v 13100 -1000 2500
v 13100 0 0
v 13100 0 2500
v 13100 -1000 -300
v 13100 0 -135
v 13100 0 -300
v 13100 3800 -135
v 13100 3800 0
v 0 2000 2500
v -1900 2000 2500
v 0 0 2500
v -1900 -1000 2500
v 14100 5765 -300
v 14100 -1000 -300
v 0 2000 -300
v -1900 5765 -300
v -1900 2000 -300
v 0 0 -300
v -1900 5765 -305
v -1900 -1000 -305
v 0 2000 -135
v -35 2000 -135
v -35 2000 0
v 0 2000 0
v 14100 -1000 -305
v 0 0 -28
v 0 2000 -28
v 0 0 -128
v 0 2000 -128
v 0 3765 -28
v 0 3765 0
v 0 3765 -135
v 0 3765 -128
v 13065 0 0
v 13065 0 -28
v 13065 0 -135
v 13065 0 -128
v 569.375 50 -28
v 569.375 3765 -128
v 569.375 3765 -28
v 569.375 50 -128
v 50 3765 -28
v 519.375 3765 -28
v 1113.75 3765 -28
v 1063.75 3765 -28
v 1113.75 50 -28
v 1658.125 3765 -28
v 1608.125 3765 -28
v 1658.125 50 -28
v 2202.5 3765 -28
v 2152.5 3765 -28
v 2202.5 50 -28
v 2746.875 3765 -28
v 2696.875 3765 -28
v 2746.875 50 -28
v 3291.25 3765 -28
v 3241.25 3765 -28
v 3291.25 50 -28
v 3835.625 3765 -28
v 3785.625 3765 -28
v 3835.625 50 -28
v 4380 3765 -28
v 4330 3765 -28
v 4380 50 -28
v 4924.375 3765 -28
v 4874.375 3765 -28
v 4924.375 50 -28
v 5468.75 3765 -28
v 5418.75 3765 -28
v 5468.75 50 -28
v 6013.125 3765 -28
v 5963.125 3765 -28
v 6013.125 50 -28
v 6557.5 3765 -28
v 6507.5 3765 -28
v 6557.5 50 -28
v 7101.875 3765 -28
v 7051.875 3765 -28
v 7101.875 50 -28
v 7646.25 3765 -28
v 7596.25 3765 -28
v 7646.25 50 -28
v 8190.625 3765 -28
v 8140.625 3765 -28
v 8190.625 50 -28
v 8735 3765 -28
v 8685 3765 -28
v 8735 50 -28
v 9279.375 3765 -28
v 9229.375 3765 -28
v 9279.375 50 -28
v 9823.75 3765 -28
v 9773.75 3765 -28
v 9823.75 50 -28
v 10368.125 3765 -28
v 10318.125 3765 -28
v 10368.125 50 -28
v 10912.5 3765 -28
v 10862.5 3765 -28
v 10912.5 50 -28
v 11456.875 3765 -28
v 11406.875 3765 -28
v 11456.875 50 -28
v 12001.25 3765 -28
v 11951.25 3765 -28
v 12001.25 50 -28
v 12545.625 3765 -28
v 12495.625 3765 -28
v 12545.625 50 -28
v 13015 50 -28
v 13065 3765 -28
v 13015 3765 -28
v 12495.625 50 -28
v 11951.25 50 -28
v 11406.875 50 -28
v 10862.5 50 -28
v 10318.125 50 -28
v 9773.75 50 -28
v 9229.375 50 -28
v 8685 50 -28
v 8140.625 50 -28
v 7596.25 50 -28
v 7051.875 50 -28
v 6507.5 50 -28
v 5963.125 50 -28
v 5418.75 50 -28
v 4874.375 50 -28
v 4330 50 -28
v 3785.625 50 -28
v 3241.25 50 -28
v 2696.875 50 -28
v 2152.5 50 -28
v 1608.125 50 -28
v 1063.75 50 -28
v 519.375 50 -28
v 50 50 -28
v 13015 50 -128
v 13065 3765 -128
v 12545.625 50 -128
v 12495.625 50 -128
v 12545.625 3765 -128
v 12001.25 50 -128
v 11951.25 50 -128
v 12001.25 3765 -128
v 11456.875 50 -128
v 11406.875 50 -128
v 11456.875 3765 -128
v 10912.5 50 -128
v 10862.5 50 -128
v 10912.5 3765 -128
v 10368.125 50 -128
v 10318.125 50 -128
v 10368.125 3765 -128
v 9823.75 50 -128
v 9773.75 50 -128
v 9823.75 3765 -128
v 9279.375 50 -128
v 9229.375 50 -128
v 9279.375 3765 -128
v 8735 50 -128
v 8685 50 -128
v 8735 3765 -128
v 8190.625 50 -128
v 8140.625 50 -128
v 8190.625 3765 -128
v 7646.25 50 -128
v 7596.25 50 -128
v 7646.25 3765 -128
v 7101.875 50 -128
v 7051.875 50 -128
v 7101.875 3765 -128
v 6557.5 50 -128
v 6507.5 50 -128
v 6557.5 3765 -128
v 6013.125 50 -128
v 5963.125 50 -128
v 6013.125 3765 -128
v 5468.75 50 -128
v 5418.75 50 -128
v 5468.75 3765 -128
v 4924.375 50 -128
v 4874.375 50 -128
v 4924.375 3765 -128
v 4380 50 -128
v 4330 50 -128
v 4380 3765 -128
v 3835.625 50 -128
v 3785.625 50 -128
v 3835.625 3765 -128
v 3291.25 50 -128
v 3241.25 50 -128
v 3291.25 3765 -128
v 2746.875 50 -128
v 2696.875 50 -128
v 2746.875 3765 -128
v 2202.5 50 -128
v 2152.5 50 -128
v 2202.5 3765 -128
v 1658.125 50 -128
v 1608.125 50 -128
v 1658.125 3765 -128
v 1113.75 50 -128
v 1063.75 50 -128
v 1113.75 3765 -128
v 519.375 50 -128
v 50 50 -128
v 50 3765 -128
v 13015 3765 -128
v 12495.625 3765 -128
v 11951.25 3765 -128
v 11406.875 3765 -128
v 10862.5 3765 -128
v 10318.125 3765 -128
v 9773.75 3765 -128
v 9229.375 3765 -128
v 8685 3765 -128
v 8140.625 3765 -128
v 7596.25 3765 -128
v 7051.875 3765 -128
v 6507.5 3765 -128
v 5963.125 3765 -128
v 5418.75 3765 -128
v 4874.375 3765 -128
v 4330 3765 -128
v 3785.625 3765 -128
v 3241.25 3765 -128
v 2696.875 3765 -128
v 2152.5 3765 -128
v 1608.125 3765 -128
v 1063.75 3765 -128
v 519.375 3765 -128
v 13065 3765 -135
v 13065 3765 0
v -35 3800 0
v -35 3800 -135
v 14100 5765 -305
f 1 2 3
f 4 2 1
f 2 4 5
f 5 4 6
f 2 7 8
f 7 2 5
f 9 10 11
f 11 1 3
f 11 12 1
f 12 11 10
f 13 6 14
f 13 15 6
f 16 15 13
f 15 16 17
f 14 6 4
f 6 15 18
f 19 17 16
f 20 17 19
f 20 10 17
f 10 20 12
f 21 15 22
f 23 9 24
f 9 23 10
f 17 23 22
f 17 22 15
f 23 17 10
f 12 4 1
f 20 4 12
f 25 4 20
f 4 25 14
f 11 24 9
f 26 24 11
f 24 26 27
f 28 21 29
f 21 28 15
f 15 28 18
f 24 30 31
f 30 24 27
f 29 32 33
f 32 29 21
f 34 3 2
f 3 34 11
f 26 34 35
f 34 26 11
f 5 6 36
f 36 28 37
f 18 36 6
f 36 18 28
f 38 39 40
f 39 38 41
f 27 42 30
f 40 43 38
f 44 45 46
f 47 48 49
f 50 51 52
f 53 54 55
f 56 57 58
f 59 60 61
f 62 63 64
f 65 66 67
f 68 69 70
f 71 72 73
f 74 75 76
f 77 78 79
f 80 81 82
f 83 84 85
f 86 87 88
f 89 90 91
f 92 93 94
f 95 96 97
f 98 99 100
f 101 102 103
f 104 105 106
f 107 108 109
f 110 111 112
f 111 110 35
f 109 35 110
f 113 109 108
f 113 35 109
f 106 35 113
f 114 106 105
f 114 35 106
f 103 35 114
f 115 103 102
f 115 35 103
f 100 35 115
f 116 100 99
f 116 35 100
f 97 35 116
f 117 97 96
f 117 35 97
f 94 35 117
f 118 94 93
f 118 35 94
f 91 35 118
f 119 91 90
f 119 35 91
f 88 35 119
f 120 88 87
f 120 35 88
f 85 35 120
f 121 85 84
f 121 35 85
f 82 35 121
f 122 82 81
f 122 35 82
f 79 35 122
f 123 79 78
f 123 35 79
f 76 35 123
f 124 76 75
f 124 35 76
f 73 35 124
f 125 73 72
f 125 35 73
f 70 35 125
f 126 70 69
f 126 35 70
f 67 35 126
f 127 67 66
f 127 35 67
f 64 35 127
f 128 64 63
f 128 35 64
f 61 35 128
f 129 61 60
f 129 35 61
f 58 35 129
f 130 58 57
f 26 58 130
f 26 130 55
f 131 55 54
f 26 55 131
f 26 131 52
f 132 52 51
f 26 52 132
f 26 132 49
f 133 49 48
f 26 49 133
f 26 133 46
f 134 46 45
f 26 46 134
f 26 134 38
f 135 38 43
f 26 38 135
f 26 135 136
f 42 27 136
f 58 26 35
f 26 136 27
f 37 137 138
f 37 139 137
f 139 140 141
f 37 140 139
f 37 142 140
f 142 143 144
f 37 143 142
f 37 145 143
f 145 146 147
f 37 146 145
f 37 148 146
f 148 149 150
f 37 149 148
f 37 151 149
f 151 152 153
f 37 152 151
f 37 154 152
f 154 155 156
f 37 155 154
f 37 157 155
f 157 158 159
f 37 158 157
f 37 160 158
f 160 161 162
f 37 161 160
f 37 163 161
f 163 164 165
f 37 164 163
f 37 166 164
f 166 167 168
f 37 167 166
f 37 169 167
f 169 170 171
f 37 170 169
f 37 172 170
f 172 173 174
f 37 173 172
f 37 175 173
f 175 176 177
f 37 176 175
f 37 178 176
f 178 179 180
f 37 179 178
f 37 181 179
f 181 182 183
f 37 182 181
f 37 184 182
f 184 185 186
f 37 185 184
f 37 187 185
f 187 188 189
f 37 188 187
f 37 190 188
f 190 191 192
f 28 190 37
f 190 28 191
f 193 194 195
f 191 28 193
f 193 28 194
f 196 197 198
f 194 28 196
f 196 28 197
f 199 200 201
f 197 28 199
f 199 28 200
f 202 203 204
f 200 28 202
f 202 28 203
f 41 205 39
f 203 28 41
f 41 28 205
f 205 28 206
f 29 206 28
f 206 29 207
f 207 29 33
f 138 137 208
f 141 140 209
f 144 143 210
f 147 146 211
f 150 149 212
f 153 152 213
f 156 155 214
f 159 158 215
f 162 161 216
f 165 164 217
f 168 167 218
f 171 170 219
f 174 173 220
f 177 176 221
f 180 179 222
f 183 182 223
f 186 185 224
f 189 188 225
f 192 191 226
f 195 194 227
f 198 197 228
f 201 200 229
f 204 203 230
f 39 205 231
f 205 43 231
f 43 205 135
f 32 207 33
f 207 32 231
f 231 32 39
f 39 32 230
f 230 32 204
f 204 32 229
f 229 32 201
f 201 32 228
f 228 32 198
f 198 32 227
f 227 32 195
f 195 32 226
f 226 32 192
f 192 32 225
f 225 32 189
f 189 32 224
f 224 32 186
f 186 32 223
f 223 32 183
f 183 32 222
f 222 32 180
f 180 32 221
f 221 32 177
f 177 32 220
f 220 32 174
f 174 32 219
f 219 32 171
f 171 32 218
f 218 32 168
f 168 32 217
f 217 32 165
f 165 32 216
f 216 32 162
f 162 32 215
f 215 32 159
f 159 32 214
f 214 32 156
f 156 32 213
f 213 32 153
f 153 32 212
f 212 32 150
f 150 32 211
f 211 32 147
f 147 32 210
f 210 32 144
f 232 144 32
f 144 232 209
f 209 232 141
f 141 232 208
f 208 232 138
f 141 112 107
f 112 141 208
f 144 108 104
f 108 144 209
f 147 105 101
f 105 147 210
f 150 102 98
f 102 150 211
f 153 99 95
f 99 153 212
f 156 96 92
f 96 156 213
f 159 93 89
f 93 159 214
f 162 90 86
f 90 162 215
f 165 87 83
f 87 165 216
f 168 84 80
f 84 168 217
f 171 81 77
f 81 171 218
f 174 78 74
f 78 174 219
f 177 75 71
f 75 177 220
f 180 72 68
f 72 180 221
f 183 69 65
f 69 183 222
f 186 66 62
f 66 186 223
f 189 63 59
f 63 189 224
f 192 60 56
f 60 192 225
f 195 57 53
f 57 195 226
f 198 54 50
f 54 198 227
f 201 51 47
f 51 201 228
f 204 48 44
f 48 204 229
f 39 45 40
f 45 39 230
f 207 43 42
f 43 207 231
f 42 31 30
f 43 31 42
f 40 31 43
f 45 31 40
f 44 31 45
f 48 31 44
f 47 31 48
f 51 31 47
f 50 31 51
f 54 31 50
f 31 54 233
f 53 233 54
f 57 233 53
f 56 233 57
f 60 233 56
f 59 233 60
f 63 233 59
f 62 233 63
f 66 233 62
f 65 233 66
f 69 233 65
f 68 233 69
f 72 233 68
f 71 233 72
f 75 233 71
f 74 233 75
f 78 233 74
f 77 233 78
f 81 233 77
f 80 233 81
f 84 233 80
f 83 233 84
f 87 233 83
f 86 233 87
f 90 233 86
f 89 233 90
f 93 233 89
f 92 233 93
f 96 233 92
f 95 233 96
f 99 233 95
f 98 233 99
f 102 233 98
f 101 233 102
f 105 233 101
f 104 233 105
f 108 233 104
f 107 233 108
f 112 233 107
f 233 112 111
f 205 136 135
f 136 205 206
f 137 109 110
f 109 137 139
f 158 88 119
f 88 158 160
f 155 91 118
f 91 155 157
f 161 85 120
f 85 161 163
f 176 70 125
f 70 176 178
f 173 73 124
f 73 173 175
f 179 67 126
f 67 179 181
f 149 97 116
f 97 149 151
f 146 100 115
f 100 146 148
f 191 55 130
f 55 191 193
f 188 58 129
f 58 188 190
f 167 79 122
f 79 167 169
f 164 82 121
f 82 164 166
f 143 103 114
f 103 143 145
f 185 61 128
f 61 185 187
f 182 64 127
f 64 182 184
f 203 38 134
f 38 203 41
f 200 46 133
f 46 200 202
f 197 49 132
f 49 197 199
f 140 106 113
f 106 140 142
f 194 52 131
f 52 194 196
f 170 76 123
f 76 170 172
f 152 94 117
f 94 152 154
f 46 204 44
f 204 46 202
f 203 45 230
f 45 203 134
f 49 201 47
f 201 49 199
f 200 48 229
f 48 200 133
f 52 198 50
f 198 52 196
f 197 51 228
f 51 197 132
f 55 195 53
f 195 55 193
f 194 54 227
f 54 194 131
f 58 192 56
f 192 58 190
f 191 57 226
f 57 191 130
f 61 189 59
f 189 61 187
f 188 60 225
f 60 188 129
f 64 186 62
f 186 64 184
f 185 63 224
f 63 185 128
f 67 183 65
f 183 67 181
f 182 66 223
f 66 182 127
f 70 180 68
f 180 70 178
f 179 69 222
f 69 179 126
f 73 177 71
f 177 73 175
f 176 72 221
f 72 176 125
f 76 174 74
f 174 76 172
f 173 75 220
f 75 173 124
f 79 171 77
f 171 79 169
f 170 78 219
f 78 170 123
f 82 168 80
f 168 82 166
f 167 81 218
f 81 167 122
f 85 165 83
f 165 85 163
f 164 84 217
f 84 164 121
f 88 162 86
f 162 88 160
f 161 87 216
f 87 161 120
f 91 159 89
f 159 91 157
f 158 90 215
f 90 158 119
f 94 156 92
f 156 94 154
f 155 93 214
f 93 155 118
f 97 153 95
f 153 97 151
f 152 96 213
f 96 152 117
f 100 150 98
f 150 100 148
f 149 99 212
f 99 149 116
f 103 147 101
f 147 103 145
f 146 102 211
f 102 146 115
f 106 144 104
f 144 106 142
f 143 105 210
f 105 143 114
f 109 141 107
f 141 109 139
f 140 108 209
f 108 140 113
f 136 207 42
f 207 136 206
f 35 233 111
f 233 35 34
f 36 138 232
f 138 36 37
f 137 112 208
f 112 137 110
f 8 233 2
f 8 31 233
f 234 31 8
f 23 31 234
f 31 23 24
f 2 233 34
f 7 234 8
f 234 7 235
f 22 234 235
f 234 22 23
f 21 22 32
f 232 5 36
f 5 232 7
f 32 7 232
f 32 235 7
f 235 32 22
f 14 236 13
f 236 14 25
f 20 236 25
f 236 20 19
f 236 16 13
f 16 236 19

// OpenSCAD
// Deck file for M

// Major constants

// Border is a special kind of brædder
border_height = 115 + 20;
border_width = 28 + 7;

// Substracting the border is a little bit of a cheat to make the house "fit"
deck_length = 13100 - border_width;
deck_width = 3800 - border_width; 
// If you change width, you need to recalculate the number of braedder
braedder_count = 31;
// And, this will also depends, etc.
// It is the number of stroer pr. braedde, but all will be sharing two stroer, so it is really one more for each braedde.
stroer_per_braedde = 6;

// The "house" is present on the drawing. Sort of. Its a block, where the "deck" is cut out from.
house_length = 15000;
house_width = 3000;
house_cut_width = 2000;
house_cut_length = deck_length;
house_height = 2800;
house_negative = 300; // House goes to the ground. The deck is raised.
ground_length = house_length;
ground_width = house_width + deck_width;

// The foundation is build as two layers, with crosses
// Bottom layer is called "Spær" in Danish
// Middle layer is called "Strøer" in Danish
// Connecting to the house is called "Rem" in Danish.
// And, the top layer is called brædder
spaer_height       = 95;
spaer_width        =  95;
spaer_suppoert_min = 1500;

stroer_height      = 100;
stroer_width       = 50;
stroer_support_min = 550;

// 125 x 32 is actually 28x115
braedder_width  = 115;
braedder_height = 28;
braedder_gap    = deck_width / braedder_count - braedder_width;
echo ("Mellemrum imellem brædder = ", braedder_gap);
// The "pap" is used between different parts to stop water / moisture from moving
pap_thickness = 3;

// Some limitations
braedder_min_distance = 5;
braedder_max_distance = 8;
braedder_max_length = 3300;

// NOTE: MUST BE CHANGED / CALCULATED
braedder_span_number = 4;
braedder_length = deck_length / braedder_span_number;
echo ("Længde af brædder = ", braedder_length);
braedder_length_gap = 2; // This is for visual feedback only.
stroer_distance = braedder_length / stroer_per_braedde;
echo ("Antal strøer pr. bræt = ", stroer_per_braedde);
echo ("Afstand imellem midten af hver strø = ", stroer_distance);

gap = 0.5;

// Note: 0,0 is bottom left corner of the deck. Also the house.

// First the house
module house() {
    difference() {
        // House block
        color([1,1,1])
        translate([-(house_length-deck_length-border_width),-(house_width-house_cut_width), -house_negative])
        cube([house_length, house_width, house_height]);

        // Cutout for the deck
        translate([0,0,-house_height/2])
        cube([deck_length+2*gap+border_width, deck_width+border_width+gap, 2*house_height + 2*gap]);
    }
}

module ground() {
    color([0,0.5,0])
    translate([-(house_length-deck_length-border_width),-(house_width-house_cut_width),-house_negative-5])
    cube([ground_length+1000, ground_width, 5]);
}

// Braedde is always with topside z = 0
module braedde() {
    color([0.6, 0.5, 0.2])
    translate([0,0,-braedder_height])
    cube([braedder_length, braedder_width, braedder_height]);
}

module half_braedde() {
    color([0.6, 0.5, 0.2])
    translate([0,0,-braedder_height])
    cube([braedder_length/2, braedder_width, braedder_height]);
}

// Does a lot of braedder
module deck() {
    for ( row = [0:braedder_count - 1]) {
        // Do something different for every other row
        if ( row % 2 == 0 ) {
            difference() {
                for ( col = [0: braedder_span_number - 1]) {
                    translate([ col* braedder_length, row * (braedder_width + braedder_gap), 0]) 
                    braedde();
                }
                // Then the gaps. This sucks, sort of.
                for ( col = [0: braedder_span_number - 1]) {
                    translate([ col* braedder_length - braedder_length_gap/2, row * (braedder_width + braedder_gap) -gap, -gap]) 
                    cube([braedder_length_gap, braedder_width + 2*gap, braedder_height + 2*gap]);
                }
            }
        } else {
            difference() {
                union() {
                    translate([ 0, row * (braedder_width + braedder_gap), 0]) 
                    half_braedde();
                    for ( col = [1: braedder_span_number - 1]) {
                        translate([ col* braedder_length - braedder_length/2, row * (braedder_width + braedder_gap), 0]) 
                        braedde();
                    }
                    translate([ braedder_span_number * braedder_length - braedder_length/2, row * (braedder_width + braedder_gap), 0]) 
                    half_braedde();
                }
                // Then the gaps. This sucks, sort of.
                for ( col = [1: braedder_span_number - 1]) {
                    translate([ col* braedder_length - braedder_length_gap/2 - braedder_length/2, row * (braedder_width + braedder_gap) -gap, -gap]) 
                    cube([braedder_length_gap, braedder_width + 2*gap, braedder_height + 2*gap]);
                }
            }
        }
    }
}

// Border is outside the deck
module border() {
    // outside house cut.
    color([0.6, 0.5, 0.2])
    translate([0,house_cut_width,-border_height])
    rotate([0,0,90])
    cube([deck_width - house_cut_width + border_width, border_width, border_height]);
    // Very long
    color([0.6, 0.5, 0.2])
    translate([0,deck_width,-border_height])
    rotate([0,0,0])
    cube([deck_length, border_width, border_height]);
    // End.
    color([0.6, 0.5, 0.2])
    translate([deck_length+border_width,0,-border_height])
    rotate([0,0,90])
    cube([deck_width + border_width, border_width, border_height]);
}

// Time for the strøer

// The rem is where the stroer are mounted
module rem() {
    color([0.4, 0.3, 0.1])
    translate([0,0,-braedder_height-stroer_height])
    cube([deck_length, stroer_width, stroer_height]);
    // TODO: Add mounts for this?
    
}

module stroe() {
    color([0.4, 0.3, 0.1])
    translate([-stroer_width/2,stroer_width,-braedder_height-stroer_height])
    cube([stroer_width, deck_width-stroer_width, stroer_height]);
}

module stroer() {
    // First and last are special.
    translate([stroer_width/2,0,0])
    stroe();
    for (i = [1:braedder_span_number * stroer_per_braedde - 1]) {
        translate([stroer_distance*i,0,0])
        stroe();
    }
    translate([stroer_distance*braedder_span_number*stroer_per_braedde - stroer_width/2,0,0])
    stroe();
}


house();
ground();
rem();
stroer();
// deck();
border();
